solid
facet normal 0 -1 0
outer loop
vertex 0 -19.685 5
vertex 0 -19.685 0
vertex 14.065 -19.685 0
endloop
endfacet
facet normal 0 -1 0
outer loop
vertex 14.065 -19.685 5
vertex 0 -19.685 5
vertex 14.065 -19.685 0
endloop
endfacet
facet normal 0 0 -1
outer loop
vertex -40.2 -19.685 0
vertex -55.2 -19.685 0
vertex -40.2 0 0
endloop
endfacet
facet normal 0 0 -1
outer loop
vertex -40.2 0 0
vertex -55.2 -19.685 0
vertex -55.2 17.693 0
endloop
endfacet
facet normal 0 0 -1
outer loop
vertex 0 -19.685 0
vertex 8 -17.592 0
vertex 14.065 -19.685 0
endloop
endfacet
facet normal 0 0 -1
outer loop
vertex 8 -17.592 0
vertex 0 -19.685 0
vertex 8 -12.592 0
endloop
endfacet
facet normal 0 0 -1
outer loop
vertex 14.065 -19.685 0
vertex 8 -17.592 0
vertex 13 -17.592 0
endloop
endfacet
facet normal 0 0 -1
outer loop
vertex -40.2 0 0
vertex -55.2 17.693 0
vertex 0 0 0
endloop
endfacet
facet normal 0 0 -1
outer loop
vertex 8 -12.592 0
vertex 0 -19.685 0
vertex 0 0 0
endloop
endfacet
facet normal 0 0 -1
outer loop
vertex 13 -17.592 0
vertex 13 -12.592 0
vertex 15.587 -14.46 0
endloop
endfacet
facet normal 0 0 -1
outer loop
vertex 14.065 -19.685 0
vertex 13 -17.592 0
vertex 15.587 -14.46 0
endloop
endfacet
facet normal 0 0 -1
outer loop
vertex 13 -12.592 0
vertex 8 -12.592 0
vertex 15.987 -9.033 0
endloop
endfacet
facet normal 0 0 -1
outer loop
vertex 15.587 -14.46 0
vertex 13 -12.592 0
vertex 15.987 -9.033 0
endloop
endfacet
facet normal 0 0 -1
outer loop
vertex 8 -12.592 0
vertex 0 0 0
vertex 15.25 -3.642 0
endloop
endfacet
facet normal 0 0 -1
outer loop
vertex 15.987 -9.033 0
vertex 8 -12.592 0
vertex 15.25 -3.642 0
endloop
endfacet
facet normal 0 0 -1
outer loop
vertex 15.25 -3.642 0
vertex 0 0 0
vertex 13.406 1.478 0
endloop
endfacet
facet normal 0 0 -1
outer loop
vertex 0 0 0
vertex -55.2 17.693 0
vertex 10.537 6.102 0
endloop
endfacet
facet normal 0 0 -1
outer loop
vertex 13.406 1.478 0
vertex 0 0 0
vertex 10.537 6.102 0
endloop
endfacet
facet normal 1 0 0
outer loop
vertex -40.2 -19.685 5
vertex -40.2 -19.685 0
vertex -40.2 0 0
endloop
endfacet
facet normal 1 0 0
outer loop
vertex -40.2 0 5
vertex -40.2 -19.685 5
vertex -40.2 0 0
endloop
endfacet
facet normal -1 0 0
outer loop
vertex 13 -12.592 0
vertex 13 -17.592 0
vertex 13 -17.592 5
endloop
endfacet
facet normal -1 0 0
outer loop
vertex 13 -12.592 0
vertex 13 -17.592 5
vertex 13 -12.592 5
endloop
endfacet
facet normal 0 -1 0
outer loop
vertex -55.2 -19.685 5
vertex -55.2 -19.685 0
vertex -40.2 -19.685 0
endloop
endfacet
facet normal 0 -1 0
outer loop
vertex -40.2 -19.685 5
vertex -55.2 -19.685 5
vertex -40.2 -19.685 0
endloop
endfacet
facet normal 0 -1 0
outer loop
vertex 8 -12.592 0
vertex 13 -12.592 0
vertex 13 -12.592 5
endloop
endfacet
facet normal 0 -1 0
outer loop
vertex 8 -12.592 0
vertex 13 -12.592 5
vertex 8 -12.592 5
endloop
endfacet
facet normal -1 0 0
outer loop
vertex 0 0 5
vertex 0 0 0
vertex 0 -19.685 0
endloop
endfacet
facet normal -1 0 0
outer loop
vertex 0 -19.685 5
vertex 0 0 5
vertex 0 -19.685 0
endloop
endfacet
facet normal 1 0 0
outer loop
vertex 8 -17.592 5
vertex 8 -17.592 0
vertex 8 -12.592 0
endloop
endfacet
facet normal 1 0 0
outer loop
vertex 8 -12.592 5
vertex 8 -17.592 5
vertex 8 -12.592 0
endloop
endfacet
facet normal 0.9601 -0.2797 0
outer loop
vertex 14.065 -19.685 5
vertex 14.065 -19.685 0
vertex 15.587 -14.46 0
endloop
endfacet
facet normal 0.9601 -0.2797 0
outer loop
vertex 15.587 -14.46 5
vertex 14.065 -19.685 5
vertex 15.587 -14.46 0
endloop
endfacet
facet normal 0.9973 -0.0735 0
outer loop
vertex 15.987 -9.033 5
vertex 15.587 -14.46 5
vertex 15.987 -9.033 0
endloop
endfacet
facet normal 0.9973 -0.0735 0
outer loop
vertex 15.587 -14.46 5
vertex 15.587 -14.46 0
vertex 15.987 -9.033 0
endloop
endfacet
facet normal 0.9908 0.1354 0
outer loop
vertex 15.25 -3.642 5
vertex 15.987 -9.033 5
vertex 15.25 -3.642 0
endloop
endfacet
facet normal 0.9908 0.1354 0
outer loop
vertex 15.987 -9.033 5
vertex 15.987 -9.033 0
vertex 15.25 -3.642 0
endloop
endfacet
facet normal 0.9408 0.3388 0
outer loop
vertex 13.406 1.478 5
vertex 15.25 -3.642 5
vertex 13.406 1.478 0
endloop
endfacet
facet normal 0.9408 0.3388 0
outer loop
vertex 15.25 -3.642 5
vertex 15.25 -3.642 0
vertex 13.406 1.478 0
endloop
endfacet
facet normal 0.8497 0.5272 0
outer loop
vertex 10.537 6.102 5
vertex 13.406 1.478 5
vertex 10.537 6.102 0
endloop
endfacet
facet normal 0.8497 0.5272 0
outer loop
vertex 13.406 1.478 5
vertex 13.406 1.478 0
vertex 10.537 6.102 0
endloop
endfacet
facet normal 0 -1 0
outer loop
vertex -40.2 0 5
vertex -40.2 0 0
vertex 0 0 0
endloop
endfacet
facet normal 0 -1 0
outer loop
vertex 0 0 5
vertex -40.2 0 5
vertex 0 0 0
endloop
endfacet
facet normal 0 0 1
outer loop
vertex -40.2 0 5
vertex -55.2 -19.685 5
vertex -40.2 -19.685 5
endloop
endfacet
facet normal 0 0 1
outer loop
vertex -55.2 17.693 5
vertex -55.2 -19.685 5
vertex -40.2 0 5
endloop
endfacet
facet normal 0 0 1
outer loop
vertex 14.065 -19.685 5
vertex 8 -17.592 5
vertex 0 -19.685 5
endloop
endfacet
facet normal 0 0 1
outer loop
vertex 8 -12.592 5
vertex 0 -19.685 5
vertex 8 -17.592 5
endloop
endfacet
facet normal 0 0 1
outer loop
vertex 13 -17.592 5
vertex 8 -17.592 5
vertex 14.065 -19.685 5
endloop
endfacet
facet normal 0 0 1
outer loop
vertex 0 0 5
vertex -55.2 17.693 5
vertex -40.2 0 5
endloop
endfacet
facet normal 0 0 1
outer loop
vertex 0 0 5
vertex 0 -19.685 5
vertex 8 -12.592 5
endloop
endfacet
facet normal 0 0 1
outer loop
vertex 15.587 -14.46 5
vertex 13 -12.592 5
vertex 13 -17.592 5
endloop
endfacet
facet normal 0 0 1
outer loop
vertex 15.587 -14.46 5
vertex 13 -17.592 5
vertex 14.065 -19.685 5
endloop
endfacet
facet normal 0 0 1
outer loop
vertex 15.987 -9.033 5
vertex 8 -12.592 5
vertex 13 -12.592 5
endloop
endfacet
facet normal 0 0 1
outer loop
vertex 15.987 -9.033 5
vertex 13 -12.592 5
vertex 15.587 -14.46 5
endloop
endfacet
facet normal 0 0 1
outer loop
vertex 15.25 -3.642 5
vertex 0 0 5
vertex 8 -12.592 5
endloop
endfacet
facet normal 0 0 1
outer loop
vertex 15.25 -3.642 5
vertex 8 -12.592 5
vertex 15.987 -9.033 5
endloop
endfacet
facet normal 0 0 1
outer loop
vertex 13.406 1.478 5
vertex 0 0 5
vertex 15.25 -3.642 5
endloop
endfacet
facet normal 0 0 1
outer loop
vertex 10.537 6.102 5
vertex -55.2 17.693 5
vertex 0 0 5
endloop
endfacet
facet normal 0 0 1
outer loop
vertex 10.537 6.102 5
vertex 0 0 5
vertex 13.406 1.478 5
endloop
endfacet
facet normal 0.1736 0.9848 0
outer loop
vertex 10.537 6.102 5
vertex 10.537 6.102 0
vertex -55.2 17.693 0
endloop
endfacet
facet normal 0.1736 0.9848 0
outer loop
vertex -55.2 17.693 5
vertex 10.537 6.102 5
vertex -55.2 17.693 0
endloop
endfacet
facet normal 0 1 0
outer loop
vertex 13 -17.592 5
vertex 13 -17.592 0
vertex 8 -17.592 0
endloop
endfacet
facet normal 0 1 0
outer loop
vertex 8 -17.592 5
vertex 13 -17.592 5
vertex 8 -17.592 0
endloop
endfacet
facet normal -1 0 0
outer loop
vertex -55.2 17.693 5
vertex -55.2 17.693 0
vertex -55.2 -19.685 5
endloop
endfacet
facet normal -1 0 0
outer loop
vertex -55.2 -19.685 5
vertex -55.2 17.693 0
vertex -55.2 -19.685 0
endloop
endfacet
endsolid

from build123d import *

# Parameters (mm, degrees)
BOSS_EXTRU_1_DEPTH      = 5
ESQUISSE2_W             = 5
ESQUISSE2_H             = 5
ENL_V_MAT_EXTRU_1_DEPTH = 5


with BuildPart() as part:
    # Esquisse1 → Boss.-Extru.1 (new body)
    with BuildSketch(Plane.XY):
        Polygon((0, 0), (0, -19.685), (20, -19.685), (20, 4.433365096), (-55.2, 17.693154046), (-55.2, -19.685), (-40.2, -19.685), (-40.2, 0), align=None)
    extrude(amount=BOSS_EXTRU_1_DEPTH)

    # Esquisse2 → Enlèv. mat.-Extru.1 (cut)
    with BuildSketch(Plane(origin=(0, 0, 0), x_dir=(-1, 0, 0), z_dir=(0, 0, -1))):
        with BuildLine():
            Line((-10.537175757, 6.101916324), (-11.23314954, 10.048979788))
            Line((-11.23314954, 10.048979788), (-30.732234233, 6.610765057))
            Line((-30.732234233, 6.610765057), (-25.732815565, -21.742347141))
            Line((-25.732815565, -21.742347141), (-14.065020128, -19.685))
            ThreePointArc((-14.065020128, -19.685), (-15.760051103, -6.318330994), (-10.537175757, 6.101916324))
        make_face()
        with Locations((-10.5, -15.0925)):
            Rectangle(ESQUISSE2_W, ESQUISSE2_H)
    extrude(amount=-ENL_V_MAT_EXTRU_1_DEPTH, mode=Mode.SUBTRACT)


solid = part.part
